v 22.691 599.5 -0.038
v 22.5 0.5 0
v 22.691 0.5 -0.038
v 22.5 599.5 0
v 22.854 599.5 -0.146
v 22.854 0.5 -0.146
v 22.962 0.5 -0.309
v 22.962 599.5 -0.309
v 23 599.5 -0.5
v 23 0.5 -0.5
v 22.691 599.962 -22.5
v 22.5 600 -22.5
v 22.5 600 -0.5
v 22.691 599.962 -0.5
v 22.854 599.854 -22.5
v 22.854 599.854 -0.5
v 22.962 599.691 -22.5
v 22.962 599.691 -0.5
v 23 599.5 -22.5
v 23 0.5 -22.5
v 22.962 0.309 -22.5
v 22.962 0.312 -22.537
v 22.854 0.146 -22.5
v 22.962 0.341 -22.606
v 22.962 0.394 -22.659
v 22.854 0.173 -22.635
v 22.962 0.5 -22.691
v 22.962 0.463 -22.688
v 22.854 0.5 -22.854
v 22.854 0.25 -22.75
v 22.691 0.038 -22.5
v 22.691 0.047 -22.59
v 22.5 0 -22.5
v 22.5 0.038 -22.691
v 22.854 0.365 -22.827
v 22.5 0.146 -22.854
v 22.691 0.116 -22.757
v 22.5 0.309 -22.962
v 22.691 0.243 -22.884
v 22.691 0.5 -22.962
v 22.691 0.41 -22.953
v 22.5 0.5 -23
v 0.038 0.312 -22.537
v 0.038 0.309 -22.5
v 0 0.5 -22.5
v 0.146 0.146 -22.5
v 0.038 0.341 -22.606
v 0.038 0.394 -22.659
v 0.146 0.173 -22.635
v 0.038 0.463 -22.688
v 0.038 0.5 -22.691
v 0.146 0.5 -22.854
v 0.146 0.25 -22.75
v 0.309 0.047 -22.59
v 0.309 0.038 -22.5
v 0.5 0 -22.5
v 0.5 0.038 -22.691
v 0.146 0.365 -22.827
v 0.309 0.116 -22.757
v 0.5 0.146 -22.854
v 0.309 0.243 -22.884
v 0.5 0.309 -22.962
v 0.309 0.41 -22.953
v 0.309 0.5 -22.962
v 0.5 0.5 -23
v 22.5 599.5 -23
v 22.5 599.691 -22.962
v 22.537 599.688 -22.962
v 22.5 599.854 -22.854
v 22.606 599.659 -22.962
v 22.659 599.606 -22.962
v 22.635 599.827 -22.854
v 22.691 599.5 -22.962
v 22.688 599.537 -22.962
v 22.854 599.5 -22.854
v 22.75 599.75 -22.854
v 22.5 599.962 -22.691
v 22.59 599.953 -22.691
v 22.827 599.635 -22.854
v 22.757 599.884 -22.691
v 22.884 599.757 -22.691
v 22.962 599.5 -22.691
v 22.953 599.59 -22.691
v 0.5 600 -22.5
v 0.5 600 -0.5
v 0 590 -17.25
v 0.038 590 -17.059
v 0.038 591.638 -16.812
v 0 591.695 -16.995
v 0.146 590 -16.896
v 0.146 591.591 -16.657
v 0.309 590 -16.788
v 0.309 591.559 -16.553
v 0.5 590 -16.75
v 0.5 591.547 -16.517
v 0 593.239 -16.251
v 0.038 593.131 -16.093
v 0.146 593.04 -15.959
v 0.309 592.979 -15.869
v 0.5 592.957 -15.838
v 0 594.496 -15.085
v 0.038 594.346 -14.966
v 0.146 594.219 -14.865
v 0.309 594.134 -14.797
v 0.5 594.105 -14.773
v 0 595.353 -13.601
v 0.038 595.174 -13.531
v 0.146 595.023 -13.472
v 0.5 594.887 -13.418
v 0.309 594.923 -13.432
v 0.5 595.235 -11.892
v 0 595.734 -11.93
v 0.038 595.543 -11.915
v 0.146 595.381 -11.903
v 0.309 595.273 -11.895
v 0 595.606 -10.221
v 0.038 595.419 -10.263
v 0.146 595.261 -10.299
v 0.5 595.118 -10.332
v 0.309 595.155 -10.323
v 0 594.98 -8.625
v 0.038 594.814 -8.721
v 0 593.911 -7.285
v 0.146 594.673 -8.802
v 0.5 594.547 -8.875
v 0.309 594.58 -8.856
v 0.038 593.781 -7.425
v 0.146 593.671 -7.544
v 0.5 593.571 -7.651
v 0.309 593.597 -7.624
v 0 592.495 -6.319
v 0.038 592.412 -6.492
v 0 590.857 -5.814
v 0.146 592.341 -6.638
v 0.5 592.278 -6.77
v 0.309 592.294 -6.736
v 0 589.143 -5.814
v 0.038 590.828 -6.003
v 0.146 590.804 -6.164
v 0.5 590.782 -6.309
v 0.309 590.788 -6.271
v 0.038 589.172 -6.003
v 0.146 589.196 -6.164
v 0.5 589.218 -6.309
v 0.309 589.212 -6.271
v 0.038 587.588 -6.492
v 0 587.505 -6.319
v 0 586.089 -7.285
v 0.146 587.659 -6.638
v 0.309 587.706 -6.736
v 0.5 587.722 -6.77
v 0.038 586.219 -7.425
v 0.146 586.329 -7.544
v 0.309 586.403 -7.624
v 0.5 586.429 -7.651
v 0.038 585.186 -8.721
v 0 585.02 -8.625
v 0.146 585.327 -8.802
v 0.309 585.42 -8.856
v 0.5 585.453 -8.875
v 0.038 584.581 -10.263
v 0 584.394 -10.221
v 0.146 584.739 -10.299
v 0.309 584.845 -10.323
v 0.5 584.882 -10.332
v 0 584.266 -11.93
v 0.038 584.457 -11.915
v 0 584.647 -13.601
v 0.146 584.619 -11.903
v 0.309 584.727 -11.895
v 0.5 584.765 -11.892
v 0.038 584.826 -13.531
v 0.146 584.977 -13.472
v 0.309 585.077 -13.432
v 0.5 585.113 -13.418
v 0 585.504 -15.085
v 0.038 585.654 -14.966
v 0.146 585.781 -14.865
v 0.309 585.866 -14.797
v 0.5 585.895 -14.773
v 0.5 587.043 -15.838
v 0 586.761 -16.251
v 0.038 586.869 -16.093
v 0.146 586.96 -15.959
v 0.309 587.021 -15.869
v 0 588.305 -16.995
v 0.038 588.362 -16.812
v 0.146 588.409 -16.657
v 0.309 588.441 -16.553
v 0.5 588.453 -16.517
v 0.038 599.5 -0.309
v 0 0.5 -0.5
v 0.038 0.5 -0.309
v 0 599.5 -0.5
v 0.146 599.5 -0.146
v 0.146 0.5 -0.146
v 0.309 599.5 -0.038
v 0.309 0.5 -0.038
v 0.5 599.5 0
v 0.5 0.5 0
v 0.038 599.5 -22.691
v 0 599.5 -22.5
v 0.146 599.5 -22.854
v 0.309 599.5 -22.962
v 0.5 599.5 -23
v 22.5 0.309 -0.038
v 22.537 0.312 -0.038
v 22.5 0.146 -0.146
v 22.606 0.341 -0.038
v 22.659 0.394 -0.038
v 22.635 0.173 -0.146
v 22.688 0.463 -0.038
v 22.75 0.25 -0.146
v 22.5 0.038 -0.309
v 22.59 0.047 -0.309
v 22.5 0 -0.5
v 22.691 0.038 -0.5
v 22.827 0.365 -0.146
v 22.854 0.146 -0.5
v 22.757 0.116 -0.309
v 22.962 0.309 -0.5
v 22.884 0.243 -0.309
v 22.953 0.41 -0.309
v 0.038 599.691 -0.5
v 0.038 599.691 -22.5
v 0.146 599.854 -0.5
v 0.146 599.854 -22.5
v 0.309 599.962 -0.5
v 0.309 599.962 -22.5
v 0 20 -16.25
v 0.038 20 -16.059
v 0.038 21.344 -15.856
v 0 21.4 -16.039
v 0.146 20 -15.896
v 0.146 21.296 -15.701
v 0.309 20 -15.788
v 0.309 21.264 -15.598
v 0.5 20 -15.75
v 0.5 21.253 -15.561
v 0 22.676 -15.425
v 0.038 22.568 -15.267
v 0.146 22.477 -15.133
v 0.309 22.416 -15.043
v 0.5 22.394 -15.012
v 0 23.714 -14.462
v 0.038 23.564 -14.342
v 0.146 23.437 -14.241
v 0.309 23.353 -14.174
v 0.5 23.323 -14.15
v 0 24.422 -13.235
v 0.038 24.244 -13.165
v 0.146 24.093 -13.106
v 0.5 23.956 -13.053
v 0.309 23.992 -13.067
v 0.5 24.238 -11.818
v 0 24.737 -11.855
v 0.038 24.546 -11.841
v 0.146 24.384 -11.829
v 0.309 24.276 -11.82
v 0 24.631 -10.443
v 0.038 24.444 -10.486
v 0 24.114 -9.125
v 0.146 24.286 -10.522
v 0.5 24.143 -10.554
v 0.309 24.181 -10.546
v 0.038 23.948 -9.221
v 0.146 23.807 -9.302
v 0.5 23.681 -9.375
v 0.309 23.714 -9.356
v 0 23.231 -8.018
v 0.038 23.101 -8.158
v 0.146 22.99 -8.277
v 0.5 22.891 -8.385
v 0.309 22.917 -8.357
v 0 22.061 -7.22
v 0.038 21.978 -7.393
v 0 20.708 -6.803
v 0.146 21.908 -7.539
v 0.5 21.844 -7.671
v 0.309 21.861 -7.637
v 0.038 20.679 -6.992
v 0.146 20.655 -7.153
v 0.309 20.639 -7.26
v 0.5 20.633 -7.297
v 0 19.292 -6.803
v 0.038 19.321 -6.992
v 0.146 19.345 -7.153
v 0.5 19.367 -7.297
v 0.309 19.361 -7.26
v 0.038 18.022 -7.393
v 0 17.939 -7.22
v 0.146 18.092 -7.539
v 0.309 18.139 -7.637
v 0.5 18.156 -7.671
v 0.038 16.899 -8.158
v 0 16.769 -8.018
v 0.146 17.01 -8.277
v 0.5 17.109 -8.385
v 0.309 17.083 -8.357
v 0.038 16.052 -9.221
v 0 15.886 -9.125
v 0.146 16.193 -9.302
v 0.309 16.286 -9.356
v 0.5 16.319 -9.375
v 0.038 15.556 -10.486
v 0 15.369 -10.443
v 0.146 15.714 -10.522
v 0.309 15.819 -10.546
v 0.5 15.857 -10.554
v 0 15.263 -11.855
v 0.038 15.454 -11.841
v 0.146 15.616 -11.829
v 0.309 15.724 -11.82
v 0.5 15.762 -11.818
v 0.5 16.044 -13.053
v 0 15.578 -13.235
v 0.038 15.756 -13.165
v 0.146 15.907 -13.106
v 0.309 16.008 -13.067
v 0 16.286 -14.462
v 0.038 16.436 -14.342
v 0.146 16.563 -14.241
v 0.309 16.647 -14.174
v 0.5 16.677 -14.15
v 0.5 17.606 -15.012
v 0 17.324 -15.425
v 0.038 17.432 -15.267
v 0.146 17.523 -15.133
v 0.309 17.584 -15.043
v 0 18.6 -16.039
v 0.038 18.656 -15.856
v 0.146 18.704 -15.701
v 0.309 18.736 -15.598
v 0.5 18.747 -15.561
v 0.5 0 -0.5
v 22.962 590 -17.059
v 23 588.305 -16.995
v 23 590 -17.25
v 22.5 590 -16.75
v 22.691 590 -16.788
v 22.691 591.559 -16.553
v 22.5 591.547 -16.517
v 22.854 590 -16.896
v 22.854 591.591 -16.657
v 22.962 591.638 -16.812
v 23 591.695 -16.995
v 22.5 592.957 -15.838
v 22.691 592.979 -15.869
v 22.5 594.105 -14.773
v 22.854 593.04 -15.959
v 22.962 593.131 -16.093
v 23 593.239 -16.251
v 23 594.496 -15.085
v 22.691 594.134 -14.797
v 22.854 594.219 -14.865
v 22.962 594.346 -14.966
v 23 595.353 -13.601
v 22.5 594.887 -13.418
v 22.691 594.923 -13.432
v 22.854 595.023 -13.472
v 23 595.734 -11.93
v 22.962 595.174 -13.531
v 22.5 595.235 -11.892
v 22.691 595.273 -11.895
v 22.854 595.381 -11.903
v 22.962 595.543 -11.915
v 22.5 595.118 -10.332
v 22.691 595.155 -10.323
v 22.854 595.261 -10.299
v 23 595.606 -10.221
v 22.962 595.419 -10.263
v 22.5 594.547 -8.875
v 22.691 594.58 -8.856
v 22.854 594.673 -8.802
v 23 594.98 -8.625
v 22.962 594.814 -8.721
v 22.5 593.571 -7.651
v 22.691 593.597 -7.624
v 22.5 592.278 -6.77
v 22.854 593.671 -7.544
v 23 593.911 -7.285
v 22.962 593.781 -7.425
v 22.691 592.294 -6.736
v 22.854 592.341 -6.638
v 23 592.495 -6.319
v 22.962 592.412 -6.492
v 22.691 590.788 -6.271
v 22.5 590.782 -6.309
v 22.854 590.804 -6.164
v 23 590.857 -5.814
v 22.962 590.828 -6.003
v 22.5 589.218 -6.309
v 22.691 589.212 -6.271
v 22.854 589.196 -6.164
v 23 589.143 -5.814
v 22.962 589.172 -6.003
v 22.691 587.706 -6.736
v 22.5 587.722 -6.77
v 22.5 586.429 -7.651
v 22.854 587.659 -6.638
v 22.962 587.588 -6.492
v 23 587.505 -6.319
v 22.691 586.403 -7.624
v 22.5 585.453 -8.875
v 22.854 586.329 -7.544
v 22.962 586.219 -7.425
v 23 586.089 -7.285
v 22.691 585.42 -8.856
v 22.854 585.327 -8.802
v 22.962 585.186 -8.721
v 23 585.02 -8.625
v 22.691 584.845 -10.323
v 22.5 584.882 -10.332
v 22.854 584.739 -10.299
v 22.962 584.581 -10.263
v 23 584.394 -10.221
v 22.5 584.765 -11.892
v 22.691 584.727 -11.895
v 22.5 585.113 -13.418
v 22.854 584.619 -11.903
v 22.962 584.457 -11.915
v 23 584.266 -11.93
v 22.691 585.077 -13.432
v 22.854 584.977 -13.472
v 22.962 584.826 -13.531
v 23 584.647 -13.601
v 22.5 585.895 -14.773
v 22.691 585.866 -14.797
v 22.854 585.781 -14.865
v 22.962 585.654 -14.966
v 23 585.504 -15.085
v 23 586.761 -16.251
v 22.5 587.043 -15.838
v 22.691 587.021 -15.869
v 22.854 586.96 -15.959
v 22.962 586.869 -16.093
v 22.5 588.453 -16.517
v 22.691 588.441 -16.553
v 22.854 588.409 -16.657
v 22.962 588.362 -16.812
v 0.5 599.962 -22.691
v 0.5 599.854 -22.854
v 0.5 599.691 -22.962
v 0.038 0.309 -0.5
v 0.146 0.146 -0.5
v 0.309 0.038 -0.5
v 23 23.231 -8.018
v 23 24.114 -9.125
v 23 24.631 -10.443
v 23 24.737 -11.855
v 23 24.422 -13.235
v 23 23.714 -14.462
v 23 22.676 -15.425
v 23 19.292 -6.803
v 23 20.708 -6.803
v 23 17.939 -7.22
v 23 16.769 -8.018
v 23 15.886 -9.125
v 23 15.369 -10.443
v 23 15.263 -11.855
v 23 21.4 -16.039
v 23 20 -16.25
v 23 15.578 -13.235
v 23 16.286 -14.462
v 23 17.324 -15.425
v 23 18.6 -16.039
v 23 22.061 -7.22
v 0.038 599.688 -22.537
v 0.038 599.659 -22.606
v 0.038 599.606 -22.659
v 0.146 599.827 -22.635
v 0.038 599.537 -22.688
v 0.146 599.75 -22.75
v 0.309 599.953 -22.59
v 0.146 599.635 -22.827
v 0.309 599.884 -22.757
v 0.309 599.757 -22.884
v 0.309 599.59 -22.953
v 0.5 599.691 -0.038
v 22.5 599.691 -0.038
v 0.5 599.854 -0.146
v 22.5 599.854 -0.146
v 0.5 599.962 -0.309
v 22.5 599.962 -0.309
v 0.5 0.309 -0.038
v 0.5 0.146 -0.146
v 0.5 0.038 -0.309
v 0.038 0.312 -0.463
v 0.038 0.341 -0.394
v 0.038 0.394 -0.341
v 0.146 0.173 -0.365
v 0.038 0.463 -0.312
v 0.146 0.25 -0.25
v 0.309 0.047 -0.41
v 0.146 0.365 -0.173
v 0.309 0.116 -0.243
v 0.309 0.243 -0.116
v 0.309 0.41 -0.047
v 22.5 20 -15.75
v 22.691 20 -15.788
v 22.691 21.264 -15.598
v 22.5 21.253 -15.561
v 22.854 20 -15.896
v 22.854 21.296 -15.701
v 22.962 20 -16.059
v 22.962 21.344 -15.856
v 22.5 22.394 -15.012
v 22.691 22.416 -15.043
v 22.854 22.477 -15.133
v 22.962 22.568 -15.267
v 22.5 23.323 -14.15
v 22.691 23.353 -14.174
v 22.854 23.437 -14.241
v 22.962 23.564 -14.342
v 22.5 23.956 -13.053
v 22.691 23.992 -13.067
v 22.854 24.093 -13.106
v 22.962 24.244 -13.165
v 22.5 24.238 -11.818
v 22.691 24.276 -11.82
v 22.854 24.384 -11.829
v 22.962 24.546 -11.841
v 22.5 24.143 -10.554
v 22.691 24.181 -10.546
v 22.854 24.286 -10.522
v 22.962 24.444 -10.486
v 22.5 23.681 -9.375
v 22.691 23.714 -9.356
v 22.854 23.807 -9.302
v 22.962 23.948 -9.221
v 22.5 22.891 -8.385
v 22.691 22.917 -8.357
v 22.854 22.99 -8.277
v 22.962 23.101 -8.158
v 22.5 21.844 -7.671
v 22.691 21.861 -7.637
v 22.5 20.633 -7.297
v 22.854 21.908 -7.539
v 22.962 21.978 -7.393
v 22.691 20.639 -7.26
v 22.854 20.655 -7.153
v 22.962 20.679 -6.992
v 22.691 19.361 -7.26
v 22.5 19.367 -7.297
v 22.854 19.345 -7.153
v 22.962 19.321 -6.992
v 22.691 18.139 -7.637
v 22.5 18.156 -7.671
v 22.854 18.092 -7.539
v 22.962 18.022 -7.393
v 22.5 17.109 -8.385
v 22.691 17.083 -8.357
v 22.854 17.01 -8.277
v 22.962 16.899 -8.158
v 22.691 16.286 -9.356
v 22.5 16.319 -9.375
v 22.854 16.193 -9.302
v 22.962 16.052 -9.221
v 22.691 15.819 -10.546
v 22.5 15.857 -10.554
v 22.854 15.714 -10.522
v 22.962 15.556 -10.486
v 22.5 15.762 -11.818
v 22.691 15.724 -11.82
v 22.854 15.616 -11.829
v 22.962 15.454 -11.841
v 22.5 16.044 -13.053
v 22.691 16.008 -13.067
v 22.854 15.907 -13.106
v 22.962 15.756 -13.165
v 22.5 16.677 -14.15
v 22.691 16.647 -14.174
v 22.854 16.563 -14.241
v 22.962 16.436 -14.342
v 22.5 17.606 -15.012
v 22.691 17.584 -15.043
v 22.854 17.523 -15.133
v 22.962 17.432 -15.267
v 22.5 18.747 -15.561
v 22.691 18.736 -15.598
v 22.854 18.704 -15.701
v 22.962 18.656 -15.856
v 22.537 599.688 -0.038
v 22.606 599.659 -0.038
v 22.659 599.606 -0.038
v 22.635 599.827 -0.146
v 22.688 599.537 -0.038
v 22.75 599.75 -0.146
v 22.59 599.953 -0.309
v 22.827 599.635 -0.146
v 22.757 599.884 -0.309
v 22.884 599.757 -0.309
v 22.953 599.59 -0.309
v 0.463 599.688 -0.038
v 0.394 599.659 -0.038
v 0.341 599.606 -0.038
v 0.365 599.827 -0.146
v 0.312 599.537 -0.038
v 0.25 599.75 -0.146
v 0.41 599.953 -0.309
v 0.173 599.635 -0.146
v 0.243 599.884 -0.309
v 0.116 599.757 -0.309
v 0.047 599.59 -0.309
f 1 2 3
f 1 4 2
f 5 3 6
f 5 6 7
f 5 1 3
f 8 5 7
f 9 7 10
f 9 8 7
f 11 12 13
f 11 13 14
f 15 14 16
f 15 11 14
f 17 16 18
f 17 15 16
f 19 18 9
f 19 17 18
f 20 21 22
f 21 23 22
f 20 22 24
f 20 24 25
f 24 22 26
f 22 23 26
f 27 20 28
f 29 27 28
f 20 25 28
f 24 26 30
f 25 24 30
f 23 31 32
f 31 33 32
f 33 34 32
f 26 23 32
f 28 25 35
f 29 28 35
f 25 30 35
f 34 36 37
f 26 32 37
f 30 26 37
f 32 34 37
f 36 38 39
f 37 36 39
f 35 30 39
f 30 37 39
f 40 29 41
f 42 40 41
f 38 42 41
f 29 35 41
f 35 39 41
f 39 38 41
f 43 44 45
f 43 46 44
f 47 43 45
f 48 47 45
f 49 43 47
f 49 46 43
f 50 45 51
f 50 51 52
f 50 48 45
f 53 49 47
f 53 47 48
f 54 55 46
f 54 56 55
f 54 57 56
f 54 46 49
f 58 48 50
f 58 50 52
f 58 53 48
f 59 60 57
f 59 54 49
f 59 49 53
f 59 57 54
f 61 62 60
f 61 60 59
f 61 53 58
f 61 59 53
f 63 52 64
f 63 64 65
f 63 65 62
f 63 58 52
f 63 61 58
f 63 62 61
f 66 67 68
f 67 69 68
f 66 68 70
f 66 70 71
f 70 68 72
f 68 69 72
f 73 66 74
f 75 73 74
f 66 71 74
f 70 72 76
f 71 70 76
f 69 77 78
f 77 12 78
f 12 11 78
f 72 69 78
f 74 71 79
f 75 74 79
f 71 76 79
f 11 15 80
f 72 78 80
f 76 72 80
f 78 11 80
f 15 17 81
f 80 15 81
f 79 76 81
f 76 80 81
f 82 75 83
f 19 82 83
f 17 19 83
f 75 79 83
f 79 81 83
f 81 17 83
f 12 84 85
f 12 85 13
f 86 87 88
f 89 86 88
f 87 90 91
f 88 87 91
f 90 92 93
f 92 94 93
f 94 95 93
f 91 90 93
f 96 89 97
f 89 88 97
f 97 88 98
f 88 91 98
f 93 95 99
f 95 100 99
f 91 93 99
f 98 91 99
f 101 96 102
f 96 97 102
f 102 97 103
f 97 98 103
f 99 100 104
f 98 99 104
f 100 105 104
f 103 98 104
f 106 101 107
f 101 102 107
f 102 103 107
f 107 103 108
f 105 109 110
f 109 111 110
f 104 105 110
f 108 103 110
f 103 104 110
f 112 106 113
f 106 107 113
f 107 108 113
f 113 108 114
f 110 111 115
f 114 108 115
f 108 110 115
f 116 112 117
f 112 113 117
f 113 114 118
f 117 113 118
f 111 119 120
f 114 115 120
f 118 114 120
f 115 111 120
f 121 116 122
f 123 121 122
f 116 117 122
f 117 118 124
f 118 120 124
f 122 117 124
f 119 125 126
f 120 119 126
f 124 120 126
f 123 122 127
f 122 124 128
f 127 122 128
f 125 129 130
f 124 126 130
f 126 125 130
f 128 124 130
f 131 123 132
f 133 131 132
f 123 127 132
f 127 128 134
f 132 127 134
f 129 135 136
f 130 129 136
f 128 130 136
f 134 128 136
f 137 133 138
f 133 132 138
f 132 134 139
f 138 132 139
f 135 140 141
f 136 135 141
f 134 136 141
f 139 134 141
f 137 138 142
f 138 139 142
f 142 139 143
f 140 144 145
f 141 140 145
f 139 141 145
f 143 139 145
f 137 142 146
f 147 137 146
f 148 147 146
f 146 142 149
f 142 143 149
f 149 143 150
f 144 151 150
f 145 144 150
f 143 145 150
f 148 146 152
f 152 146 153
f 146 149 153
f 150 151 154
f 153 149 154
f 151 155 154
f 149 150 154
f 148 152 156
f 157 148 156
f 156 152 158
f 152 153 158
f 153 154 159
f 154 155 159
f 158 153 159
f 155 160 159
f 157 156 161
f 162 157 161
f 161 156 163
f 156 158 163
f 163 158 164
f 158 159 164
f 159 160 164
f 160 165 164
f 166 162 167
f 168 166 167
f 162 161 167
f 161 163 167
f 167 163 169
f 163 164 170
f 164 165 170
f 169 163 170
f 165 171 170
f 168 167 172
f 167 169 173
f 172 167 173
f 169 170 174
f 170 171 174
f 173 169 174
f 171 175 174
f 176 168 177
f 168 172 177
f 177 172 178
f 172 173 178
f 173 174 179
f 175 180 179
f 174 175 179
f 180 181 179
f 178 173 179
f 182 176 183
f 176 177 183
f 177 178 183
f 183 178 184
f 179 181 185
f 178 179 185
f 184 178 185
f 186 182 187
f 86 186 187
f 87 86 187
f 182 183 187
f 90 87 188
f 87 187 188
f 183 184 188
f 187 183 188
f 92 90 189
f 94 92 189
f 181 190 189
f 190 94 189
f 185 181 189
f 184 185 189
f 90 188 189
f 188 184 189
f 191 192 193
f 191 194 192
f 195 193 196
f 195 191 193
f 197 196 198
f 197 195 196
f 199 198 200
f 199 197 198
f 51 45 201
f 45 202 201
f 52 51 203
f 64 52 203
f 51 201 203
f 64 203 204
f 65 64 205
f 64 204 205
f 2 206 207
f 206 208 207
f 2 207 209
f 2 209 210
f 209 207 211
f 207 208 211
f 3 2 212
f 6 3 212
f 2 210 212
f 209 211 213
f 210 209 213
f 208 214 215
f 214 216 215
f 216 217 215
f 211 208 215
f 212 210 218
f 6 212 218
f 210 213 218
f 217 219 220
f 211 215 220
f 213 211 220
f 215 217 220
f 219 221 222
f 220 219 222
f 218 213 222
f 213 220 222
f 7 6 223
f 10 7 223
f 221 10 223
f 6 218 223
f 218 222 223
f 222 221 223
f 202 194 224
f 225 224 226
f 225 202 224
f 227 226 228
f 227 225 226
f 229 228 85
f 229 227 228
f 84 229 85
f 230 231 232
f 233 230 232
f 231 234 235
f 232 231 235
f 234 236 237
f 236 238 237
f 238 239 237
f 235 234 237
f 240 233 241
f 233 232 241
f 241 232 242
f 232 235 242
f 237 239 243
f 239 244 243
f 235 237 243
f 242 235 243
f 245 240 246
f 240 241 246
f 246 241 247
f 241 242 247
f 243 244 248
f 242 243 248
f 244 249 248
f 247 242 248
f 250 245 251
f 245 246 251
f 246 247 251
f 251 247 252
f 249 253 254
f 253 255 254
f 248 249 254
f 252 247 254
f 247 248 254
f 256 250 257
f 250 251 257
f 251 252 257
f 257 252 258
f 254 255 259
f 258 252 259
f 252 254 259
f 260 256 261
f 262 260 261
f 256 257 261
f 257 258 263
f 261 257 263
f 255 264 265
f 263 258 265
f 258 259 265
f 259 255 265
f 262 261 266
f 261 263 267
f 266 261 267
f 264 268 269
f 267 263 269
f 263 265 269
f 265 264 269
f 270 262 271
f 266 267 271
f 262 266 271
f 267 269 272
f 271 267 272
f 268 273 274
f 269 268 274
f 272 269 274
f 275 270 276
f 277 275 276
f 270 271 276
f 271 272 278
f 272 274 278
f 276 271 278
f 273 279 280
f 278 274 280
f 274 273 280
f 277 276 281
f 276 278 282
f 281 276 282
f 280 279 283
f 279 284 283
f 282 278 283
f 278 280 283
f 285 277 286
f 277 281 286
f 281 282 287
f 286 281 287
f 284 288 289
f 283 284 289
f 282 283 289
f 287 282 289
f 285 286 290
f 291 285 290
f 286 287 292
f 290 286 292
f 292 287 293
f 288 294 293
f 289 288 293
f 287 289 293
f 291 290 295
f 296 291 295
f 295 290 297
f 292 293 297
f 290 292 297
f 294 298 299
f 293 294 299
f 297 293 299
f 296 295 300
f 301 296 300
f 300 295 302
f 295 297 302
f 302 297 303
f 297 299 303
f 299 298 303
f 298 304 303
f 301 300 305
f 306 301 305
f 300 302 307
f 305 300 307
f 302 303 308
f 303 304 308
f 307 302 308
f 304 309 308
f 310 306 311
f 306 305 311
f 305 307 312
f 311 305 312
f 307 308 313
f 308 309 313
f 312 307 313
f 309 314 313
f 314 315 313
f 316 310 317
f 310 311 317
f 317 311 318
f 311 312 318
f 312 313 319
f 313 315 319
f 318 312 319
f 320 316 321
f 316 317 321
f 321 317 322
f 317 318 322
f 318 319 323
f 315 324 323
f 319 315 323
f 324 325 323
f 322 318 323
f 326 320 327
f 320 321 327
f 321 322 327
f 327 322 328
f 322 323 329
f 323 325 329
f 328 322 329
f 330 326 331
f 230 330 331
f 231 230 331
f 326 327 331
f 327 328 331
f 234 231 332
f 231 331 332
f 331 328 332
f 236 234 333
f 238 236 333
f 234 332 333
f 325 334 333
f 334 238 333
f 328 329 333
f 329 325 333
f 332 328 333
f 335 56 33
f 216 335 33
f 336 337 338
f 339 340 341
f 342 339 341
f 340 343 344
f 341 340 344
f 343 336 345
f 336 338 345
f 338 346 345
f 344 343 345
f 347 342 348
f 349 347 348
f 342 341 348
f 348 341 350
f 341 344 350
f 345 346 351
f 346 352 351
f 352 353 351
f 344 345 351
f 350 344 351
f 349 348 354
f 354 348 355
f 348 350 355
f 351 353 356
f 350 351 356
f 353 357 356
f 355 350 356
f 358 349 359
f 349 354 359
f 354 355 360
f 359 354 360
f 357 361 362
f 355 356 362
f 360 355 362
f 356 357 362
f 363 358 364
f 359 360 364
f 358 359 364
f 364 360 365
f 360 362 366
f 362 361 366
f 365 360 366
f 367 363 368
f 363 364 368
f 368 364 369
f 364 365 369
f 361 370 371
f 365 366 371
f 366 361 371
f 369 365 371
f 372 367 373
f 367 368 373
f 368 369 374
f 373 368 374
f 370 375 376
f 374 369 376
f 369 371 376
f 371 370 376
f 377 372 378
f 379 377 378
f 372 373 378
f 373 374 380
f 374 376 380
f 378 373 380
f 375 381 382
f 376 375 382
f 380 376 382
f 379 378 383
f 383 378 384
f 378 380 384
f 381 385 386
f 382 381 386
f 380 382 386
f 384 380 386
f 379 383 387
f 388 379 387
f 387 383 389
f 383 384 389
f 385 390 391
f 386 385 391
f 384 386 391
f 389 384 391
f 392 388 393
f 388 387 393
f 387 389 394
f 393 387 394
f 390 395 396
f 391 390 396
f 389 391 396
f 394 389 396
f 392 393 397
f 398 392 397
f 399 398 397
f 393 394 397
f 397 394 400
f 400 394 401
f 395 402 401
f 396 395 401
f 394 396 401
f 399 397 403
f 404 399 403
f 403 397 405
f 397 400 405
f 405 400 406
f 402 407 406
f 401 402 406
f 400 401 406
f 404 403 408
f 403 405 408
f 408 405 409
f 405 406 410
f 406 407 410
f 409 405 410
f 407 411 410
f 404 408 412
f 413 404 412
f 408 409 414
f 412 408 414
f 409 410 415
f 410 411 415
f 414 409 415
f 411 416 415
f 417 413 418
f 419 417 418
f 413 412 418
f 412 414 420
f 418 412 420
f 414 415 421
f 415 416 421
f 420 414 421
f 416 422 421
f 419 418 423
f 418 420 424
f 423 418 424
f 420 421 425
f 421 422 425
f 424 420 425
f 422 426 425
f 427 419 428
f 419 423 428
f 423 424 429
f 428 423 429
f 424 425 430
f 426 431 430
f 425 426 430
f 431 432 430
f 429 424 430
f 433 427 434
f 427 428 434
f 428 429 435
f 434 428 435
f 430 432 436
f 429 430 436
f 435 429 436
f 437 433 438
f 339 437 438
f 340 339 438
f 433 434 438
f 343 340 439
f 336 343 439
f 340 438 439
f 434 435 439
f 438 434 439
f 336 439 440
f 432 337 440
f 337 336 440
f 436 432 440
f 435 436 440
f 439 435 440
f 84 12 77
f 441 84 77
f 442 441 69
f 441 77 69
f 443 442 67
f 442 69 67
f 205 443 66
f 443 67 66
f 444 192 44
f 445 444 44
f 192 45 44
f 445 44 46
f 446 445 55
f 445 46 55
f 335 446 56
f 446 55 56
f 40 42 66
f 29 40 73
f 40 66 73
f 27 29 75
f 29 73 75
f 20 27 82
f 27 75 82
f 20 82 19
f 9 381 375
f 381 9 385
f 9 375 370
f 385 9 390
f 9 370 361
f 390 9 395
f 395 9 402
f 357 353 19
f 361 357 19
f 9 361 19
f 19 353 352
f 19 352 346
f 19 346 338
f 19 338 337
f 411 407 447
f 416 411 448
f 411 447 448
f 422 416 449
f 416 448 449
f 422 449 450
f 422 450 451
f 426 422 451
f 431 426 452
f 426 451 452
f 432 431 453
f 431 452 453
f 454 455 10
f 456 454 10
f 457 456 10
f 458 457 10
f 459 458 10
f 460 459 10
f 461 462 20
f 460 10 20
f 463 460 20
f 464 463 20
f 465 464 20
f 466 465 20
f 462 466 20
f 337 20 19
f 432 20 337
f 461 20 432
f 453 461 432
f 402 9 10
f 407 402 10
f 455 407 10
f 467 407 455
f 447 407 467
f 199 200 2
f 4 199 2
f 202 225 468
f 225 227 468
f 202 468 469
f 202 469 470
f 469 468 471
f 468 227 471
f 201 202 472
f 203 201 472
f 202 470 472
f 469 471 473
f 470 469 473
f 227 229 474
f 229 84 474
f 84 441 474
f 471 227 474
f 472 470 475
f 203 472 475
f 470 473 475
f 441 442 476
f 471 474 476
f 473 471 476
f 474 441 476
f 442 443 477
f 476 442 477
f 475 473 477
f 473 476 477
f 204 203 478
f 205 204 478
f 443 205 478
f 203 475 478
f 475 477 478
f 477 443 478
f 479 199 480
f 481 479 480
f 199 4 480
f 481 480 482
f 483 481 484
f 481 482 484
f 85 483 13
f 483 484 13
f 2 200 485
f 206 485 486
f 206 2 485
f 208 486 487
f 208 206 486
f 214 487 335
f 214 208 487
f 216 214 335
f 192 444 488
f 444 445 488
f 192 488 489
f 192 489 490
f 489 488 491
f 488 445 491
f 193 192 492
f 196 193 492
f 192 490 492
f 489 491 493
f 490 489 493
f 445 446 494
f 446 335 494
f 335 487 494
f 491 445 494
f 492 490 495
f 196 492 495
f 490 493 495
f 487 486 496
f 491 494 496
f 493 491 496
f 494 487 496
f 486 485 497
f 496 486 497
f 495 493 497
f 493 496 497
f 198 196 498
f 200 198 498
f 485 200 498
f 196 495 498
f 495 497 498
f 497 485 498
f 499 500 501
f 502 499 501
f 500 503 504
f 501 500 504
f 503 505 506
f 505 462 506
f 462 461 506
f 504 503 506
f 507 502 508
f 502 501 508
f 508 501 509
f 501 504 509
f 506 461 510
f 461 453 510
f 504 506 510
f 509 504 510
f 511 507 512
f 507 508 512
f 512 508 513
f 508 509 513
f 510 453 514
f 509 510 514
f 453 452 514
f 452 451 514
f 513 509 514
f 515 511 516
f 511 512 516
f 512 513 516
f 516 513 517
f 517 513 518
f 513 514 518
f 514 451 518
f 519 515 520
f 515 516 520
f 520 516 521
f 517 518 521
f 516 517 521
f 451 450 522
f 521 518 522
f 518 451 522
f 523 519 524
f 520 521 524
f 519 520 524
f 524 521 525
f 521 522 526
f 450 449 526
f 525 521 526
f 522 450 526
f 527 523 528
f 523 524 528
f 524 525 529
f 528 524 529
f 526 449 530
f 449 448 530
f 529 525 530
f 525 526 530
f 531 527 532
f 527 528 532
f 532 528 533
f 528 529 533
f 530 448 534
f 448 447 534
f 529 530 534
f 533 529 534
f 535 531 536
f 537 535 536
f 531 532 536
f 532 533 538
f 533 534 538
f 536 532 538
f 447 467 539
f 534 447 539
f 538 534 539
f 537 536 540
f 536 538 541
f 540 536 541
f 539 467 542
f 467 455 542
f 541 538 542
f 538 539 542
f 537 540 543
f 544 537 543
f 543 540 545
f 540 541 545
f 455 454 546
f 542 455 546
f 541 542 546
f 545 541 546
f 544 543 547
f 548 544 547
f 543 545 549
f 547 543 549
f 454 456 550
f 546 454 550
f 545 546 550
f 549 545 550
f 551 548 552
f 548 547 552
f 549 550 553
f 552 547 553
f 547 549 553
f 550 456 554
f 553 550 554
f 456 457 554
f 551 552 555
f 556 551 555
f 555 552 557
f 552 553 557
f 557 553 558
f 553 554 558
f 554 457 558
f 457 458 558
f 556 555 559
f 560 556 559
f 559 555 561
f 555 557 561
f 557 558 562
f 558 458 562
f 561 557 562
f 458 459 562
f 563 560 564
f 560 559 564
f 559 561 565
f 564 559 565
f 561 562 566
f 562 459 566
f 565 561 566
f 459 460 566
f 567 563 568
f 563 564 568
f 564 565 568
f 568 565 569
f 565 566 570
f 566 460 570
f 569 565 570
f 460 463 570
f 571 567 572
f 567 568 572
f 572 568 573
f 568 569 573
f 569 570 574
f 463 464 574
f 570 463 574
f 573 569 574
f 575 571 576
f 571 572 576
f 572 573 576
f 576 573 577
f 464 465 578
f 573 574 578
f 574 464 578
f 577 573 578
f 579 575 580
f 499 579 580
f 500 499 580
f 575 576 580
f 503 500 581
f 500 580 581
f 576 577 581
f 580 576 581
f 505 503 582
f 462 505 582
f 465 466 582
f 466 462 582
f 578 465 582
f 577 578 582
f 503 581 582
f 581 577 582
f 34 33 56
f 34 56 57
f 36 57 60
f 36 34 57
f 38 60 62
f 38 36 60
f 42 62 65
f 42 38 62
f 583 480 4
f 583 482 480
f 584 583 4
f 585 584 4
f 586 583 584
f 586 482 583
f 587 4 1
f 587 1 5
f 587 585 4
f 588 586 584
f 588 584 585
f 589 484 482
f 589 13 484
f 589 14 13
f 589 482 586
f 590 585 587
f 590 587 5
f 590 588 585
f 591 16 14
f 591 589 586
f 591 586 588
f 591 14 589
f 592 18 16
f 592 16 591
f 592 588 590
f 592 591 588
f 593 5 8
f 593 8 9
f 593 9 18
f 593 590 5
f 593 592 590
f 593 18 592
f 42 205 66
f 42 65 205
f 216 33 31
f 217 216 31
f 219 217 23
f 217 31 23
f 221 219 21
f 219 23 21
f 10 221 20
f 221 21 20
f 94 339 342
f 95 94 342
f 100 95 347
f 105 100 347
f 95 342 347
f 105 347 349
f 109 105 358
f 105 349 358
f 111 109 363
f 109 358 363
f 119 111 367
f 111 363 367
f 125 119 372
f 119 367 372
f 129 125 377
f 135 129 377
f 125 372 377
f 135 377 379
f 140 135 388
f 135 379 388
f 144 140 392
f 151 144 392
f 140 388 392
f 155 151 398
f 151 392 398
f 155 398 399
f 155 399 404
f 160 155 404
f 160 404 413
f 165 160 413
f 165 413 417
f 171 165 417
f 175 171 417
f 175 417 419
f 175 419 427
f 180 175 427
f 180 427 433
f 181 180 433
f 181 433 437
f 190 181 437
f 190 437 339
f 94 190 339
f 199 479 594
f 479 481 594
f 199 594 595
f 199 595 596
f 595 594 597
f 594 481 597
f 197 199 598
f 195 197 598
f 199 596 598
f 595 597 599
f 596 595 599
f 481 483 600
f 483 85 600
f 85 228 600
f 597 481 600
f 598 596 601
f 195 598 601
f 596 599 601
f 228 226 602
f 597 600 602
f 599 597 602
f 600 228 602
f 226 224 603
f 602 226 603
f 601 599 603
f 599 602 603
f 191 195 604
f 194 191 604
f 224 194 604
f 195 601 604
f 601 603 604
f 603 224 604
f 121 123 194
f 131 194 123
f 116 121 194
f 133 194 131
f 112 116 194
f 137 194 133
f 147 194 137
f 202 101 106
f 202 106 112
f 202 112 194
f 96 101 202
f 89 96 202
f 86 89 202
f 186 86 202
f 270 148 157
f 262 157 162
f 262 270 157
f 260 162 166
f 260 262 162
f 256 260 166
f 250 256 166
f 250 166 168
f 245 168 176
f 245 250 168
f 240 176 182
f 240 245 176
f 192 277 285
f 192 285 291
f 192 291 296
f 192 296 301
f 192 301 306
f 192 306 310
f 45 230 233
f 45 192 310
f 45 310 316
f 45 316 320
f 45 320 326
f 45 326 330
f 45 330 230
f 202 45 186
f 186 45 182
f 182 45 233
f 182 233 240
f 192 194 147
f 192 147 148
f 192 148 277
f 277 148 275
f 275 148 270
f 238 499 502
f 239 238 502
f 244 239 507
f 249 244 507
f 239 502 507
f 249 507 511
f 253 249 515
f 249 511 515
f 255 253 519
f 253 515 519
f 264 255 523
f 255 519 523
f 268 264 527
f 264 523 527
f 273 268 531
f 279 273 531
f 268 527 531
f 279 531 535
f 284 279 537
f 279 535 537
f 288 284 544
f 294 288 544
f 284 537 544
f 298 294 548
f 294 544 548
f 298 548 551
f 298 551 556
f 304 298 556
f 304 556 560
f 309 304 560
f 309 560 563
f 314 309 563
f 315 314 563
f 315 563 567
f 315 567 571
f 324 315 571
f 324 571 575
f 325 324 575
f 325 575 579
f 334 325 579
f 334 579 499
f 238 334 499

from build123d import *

# Parameters (mm, degrees)
SKETCH1_W           = 23
SKETCH1_H           = 23
BOSS_EXTRUDE1_DEPTH = 600
SKETCH2_R           = 4.25
CUT_EXTRUDE1_DEPTH  = 350
SKETCH3_R           = 5.25
CUT_EXTRUDE2_DEPTH  = 49
FILLET1_R           = 0.5


with BuildPart() as part:
    # Sketch1 → Boss-Extrude1 (new body)
    with BuildSketch(Plane(origin=(0, 0, 0), x_dir=(1, 0, 0), z_dir=(0, 1, 0))):
        with Locations((11.5, 11.5)):
            Rectangle(SKETCH1_W, SKETCH1_H)
    extrude(amount=BOSS_EXTRUDE1_DEPTH)

    # Sketch2 → Cut-Extrude1 (cut)
    with BuildSketch(Plane(origin=(23, 0, 0), x_dir=(0, 0, -1), z_dir=(1, 0, 0))):
        with Locations((11.5, 20)):
            Circle(SKETCH2_R)
    extrude(amount=-CUT_EXTRUDE1_DEPTH, mode=Mode.SUBTRACT)

    # Sketch3 → Cut-Extrude2 (cut)
    with BuildSketch(Plane(origin=(23, 0, 0), x_dir=(0, 0, -1), z_dir=(1, 0, 0))):
        with Locations((11.5, 590)):
            Circle(SKETCH3_R)
    extrude(amount=-CUT_EXTRUDE2_DEPTH, mode=Mode.SUBTRACT)

    # Fillet1
    fillet1_edges = [part.edges().sort_by_distance(p)[0] for p in [
        (23, 600, -11.5),
        (11.5, 600, -23),
        (0, 20, -7.25),
        (23, 20, -7.25),
        (0, 590, -6.25),
        (23, 590, -6.25),
        (0, 600, -11.5),
        (11.5, 0, -23),
        (23, 0, -11.5),
        (11.5, 0, 0),
        (0, 0, -11.5),
        (11.5, 600, 0),
        (0, 300, -23),
        (23, 300, -23),
        (23, 300, 0),
        (0, 300, 0),
    ]]
    fillet(fillet1_edges, radius=FILLET1_R)


solid = part.part
